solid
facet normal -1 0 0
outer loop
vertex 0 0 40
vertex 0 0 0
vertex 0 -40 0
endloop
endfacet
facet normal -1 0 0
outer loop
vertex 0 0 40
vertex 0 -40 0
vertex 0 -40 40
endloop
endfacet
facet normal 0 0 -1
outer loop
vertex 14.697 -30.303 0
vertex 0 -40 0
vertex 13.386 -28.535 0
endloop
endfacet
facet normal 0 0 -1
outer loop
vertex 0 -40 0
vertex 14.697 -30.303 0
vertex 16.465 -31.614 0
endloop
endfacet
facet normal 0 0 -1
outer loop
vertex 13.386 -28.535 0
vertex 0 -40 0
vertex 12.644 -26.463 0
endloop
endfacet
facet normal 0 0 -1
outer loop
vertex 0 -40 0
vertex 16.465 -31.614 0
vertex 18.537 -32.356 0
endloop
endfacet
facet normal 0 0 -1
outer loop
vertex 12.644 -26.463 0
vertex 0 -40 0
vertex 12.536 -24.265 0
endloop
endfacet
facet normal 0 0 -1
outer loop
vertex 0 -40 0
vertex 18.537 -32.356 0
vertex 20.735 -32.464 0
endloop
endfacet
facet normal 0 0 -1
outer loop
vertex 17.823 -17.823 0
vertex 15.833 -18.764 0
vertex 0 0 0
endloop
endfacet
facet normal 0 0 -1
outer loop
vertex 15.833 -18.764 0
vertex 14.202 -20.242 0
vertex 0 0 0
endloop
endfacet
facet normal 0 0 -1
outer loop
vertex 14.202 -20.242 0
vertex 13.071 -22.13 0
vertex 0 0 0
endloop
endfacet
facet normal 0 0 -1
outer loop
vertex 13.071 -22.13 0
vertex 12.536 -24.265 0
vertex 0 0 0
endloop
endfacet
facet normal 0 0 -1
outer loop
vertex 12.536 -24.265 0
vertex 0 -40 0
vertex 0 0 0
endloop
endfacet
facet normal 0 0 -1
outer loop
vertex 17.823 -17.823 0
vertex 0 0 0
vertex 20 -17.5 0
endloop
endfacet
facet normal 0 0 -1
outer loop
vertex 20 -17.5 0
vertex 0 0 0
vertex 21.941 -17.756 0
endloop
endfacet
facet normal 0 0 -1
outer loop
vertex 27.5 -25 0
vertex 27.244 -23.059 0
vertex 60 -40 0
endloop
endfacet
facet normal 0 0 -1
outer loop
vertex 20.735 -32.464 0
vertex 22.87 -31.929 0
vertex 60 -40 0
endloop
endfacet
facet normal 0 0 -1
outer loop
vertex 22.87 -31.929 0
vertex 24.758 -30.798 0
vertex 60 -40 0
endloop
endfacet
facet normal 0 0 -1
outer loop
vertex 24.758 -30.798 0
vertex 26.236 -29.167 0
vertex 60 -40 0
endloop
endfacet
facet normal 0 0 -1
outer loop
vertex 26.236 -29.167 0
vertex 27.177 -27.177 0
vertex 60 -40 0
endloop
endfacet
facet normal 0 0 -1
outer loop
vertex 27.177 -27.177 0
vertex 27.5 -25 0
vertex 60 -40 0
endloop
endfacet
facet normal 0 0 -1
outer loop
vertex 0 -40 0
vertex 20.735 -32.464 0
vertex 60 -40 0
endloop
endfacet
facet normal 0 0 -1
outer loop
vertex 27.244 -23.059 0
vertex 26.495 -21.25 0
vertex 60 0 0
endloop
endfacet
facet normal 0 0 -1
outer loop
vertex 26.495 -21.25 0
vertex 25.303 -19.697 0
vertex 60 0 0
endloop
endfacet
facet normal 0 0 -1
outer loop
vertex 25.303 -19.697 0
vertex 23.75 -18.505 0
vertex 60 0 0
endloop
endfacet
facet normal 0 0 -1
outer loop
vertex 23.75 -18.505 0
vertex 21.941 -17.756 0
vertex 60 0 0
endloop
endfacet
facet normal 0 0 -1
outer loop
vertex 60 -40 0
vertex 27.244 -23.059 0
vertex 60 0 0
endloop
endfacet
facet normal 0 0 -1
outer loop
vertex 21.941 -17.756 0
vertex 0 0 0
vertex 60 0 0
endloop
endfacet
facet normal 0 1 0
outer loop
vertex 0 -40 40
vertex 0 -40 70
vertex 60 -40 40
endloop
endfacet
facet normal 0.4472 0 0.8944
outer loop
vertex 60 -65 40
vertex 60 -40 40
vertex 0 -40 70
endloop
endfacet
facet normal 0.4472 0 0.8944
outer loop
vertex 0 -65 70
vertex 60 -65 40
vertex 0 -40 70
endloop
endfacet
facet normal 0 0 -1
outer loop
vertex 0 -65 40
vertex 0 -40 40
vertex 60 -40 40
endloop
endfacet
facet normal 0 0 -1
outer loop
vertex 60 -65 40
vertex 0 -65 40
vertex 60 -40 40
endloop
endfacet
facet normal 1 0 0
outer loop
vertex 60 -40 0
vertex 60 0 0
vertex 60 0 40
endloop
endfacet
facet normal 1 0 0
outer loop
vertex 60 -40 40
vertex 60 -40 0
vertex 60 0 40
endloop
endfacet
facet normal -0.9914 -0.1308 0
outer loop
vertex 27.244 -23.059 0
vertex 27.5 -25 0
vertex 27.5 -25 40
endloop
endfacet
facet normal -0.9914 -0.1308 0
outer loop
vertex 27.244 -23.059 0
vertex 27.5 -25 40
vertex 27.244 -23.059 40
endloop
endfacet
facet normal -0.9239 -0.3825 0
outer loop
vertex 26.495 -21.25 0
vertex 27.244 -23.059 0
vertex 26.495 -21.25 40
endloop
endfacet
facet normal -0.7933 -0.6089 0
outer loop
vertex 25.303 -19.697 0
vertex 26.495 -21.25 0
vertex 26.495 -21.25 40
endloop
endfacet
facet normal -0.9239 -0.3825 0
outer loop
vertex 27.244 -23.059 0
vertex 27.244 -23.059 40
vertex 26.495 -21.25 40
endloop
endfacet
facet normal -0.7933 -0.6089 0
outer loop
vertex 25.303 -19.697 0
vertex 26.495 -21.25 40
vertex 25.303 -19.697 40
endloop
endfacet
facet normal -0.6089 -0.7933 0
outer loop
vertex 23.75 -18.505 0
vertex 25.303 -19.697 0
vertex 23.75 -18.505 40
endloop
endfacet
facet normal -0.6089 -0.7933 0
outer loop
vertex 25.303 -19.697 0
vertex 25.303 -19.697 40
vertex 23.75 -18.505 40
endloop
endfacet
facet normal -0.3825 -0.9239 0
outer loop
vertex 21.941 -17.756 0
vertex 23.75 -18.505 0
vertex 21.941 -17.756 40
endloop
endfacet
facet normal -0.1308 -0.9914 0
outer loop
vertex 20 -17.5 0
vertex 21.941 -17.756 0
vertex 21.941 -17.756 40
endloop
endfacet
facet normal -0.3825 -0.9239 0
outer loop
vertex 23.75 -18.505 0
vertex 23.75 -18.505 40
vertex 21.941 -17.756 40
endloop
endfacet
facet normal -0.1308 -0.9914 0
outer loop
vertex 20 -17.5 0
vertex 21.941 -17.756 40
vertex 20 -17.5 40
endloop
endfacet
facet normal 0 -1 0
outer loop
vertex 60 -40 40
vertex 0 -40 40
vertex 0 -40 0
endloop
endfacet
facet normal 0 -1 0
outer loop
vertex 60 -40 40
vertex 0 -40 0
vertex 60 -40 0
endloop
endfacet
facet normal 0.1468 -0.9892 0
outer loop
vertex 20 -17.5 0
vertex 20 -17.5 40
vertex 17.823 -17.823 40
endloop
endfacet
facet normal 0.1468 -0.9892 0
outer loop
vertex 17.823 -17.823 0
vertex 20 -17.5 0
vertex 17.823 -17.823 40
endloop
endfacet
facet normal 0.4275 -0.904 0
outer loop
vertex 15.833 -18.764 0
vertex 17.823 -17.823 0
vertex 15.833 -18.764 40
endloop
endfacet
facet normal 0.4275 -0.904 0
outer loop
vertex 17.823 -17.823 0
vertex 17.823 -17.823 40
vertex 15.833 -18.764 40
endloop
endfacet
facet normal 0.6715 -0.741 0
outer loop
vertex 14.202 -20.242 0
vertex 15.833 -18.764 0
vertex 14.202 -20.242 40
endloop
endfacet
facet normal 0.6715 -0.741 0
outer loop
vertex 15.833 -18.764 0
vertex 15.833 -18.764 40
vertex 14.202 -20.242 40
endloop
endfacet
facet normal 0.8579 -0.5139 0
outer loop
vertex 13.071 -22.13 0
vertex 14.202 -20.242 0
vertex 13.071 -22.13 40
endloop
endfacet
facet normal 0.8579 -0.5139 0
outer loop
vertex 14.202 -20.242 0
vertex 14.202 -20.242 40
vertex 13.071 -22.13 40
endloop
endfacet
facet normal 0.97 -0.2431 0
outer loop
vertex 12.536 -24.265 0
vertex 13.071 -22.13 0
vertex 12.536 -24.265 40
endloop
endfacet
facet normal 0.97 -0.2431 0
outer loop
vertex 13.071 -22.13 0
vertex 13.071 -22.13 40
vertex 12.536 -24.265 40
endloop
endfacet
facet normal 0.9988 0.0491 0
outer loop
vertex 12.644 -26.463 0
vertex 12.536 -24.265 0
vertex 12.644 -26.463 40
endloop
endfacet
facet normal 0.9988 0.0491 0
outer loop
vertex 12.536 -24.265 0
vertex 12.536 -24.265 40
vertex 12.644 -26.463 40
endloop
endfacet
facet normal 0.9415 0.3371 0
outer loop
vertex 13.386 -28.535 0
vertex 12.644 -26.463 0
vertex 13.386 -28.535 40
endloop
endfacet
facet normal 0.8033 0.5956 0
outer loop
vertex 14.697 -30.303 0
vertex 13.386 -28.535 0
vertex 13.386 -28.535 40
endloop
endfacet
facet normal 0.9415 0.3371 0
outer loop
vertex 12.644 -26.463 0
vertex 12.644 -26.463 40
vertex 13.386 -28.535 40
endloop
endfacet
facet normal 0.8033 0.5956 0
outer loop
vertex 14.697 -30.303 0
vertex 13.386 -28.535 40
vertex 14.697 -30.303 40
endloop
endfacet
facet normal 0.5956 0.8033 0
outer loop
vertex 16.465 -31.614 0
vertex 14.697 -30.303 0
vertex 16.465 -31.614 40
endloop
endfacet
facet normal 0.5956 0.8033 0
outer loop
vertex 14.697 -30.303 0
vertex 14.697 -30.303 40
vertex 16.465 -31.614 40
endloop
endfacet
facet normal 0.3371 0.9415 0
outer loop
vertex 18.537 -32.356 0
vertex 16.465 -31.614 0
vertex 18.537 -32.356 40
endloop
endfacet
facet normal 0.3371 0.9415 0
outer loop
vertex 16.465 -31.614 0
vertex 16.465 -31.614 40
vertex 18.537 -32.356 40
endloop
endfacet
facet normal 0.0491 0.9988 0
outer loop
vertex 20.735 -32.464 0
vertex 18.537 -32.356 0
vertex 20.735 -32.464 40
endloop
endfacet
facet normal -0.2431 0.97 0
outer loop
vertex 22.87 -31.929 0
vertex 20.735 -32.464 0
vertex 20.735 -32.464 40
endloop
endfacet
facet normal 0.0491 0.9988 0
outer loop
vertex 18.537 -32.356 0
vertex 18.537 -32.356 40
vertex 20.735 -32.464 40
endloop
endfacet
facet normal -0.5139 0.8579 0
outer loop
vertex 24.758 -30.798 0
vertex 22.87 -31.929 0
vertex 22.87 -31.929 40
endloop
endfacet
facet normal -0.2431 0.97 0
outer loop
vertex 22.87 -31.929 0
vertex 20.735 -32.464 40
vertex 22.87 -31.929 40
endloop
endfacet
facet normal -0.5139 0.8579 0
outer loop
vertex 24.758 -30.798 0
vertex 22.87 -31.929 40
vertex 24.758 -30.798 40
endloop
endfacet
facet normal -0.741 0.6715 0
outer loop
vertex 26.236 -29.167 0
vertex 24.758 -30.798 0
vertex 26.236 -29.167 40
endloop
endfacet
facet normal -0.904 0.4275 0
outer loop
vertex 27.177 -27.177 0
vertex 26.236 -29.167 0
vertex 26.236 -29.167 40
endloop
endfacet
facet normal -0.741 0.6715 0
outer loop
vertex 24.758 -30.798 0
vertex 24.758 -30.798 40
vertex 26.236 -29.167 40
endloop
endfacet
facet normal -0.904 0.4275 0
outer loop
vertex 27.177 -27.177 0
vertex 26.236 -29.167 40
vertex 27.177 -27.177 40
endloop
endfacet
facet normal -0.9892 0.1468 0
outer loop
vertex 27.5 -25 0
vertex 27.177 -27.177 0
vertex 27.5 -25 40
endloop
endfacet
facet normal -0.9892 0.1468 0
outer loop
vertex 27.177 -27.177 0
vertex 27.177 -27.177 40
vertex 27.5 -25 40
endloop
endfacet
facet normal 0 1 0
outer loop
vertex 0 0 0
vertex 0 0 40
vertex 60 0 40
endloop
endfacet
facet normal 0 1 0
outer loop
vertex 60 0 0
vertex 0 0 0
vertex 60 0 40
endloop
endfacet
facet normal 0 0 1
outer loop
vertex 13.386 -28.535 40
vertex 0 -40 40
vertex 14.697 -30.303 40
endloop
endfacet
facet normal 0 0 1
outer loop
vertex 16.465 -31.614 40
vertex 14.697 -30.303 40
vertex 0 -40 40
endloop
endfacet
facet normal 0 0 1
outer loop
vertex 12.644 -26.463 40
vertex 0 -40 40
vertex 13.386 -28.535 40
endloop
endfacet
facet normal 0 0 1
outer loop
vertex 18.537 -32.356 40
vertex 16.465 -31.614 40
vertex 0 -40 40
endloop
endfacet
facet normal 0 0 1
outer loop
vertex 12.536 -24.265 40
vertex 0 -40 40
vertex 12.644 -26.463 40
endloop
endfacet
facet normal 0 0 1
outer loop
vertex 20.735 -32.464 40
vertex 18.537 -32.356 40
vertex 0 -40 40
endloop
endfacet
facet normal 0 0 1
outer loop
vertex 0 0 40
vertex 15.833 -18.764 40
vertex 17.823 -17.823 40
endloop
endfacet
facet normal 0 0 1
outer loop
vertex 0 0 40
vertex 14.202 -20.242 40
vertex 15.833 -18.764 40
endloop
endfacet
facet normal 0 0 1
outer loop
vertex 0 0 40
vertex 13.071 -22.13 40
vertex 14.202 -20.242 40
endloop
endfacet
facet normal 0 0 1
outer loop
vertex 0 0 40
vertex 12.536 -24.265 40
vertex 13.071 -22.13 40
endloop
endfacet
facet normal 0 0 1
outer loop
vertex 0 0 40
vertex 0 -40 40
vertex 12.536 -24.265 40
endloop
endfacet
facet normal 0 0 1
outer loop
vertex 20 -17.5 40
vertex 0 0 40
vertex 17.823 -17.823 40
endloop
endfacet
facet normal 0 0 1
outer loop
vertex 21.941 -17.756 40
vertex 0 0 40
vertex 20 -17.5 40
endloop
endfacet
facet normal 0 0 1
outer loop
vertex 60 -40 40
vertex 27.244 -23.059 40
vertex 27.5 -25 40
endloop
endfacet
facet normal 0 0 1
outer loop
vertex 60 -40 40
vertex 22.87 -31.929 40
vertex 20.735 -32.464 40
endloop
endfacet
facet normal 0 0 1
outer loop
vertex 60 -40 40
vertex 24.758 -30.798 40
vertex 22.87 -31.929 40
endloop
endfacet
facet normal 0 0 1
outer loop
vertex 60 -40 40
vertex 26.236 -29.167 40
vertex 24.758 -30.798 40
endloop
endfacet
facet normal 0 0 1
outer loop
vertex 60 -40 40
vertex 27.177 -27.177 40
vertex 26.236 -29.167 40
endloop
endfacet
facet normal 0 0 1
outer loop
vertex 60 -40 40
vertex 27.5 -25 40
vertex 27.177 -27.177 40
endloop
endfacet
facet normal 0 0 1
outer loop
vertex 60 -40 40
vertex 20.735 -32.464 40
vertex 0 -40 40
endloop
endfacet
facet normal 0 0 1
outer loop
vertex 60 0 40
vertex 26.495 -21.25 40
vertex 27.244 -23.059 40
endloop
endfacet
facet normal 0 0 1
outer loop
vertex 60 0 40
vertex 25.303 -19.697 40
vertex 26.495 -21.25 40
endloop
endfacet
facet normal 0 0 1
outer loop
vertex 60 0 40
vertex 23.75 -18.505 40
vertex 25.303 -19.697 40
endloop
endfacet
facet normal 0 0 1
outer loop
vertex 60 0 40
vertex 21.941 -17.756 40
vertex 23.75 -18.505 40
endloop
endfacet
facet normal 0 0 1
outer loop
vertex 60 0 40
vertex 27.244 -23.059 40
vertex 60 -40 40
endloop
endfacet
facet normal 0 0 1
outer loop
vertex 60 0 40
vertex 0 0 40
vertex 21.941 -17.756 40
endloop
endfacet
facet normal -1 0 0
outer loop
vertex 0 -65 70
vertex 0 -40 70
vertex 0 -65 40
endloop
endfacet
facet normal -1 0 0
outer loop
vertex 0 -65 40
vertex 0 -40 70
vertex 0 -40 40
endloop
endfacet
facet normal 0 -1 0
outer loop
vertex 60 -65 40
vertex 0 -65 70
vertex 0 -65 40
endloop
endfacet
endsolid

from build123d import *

# Parameters (mm, degrees)
F0_W     = 60
F0_H     = 40
F1_DEPTH = 40
F3_DEPTH = 40
F5_DEPTH = 25


with BuildPart() as f1:
    # F0 (on Front) → F1 (new body)
    with BuildSketch(Plane.XZ):
        with Locations((30, 20)):
            Rectangle(F0_W, F0_H)
    extrude(amount=F1_DEPTH)

    # F2 (on face) → F3 (cut, through all)
    with BuildSketch(Plane.XY.offset(40)):
        with BuildLine():
            ThreePointArc((27.5, -25), (25.303301, -19.696699), (20, -17.5))
            ThreePointArc((20, -17.5), (14.696699, -30.303301), (27.5, -25))
        make_face()
    extrude(amount=-F3_DEPTH, mode=Mode.SUBTRACT)


with BuildPart() as f5:
    # F4 (on face) → F5 (new body)
    with BuildSketch(Plane.XZ.offset(40)):
        Polygon((0, 70), (0, 40), (60, 40), align=None)
    extrude(amount=F5_DEPTH)


solid = Compound([f1.part, f5.part])
